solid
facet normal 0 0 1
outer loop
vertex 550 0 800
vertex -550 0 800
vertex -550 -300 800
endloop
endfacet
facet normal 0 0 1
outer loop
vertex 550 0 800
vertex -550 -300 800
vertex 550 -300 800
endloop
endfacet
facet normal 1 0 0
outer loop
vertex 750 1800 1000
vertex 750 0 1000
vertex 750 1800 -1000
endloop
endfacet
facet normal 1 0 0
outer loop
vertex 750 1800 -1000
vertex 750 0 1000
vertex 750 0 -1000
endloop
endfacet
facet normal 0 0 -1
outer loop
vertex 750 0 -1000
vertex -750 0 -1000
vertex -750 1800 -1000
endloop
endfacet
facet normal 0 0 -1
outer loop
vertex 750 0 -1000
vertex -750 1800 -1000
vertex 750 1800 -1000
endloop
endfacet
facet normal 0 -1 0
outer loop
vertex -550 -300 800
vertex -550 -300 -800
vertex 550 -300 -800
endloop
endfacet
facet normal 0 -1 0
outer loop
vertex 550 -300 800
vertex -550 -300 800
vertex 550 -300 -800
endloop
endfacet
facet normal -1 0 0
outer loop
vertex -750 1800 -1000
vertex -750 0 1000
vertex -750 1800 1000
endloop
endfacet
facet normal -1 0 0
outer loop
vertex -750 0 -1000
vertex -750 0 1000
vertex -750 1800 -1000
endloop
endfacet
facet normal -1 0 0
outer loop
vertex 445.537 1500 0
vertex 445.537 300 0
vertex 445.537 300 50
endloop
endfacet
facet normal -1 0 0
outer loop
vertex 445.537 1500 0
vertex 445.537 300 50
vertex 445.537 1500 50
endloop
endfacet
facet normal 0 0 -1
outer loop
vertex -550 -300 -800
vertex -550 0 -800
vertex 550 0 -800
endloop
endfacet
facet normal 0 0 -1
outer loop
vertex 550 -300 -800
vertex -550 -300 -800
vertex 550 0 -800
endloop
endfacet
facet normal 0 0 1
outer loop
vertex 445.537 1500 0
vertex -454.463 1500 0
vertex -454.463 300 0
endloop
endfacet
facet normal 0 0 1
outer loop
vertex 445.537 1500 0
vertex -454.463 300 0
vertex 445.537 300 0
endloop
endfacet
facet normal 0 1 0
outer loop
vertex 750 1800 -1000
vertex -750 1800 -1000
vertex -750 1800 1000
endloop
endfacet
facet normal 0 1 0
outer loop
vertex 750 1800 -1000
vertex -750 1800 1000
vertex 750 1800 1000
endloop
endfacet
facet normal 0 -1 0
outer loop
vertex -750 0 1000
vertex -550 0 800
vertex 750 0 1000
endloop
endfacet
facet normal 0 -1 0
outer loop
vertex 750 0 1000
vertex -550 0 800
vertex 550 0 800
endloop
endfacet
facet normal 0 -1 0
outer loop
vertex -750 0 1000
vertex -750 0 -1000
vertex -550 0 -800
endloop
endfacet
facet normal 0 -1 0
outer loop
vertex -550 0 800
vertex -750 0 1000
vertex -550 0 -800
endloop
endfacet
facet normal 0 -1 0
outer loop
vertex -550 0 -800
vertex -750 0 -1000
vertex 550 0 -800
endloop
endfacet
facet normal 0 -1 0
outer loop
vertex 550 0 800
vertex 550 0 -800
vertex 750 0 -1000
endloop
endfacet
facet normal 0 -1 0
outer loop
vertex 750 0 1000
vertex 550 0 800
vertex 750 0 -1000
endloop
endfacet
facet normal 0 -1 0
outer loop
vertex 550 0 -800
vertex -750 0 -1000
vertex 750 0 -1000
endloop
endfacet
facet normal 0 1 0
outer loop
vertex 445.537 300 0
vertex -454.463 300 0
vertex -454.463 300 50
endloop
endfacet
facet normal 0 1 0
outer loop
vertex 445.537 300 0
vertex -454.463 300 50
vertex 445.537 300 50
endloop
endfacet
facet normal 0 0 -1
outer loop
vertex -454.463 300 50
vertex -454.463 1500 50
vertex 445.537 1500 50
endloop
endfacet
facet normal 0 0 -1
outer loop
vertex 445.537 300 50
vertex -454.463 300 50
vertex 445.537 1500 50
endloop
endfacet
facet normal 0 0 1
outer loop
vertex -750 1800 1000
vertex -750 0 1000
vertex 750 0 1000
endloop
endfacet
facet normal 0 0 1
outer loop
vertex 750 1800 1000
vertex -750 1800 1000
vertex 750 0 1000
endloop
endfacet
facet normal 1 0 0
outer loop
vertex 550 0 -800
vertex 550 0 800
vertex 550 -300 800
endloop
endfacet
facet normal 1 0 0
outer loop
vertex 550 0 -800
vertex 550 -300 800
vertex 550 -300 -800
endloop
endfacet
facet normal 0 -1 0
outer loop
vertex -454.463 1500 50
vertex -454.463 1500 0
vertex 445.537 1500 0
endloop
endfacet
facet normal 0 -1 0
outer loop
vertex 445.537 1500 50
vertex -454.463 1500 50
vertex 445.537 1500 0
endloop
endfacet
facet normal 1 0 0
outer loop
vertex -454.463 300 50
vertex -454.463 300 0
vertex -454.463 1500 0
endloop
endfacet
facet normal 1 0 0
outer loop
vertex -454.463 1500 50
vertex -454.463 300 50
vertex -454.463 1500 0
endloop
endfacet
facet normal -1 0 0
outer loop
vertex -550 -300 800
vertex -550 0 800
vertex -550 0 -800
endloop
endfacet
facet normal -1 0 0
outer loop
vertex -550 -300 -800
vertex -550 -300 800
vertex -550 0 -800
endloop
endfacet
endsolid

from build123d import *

# Parameters (mm, degrees)
SKETCH2_W           = 1500
SKETCH2_H           = 2000
BOSS_EXTRUDE1_DEPTH = 1800
SKETCH3_W           = 1100
SKETCH3_H           = 1600
BOSS_EXTRUDE2_DEPTH = 300
SKETCH4_W           = 900
SKETCH4_H           = 1200
CUT_EXTRUDE1_DEPTH  = 50
SKETCH5_W           = 600
SKETCH5_H           = 400
BOSS_EXTRUDE3_DEPTH = 50


with BuildPart() as part:
    # Sketch2 → Boss-Extrude1 (new body)
    with BuildSketch(Plane(origin=(0, 0, 0), x_dir=(1, 0, 0), z_dir=(0, 1, 0))):
        Rectangle(SKETCH2_W, SKETCH2_H)
    extrude(amount=BOSS_EXTRUDE1_DEPTH)

    # Sketch3 → Boss-Extrude2 (add)
    with BuildSketch(Plane(origin=(0, 0, 0), x_dir=(1, 0, 0), z_dir=(0, 1, 0))):
        Rectangle(SKETCH3_W, SKETCH3_H)
    extrude(amount=-BOSS_EXTRUDE2_DEPTH)

    # Sketch4 → Cut-Extrude1 (cut)
    with BuildSketch(Plane.XY):
        with Locations((-4.462739717, 900)):
            Rectangle(SKETCH4_W, SKETCH4_H)
    extrude(amount=CUT_EXTRUDE1_DEPTH, mode=Mode.SUBTRACT)

    # Sketch5 → Boss-Extrude3 (add)
    with BuildSketch(Plane.XY):
        with Locations((71.403835473, 918.76082198)):
            Rectangle(SKETCH5_W, SKETCH5_H)
    extrude(amount=-BOSS_EXTRUDE3_DEPTH)


solid = part.part
